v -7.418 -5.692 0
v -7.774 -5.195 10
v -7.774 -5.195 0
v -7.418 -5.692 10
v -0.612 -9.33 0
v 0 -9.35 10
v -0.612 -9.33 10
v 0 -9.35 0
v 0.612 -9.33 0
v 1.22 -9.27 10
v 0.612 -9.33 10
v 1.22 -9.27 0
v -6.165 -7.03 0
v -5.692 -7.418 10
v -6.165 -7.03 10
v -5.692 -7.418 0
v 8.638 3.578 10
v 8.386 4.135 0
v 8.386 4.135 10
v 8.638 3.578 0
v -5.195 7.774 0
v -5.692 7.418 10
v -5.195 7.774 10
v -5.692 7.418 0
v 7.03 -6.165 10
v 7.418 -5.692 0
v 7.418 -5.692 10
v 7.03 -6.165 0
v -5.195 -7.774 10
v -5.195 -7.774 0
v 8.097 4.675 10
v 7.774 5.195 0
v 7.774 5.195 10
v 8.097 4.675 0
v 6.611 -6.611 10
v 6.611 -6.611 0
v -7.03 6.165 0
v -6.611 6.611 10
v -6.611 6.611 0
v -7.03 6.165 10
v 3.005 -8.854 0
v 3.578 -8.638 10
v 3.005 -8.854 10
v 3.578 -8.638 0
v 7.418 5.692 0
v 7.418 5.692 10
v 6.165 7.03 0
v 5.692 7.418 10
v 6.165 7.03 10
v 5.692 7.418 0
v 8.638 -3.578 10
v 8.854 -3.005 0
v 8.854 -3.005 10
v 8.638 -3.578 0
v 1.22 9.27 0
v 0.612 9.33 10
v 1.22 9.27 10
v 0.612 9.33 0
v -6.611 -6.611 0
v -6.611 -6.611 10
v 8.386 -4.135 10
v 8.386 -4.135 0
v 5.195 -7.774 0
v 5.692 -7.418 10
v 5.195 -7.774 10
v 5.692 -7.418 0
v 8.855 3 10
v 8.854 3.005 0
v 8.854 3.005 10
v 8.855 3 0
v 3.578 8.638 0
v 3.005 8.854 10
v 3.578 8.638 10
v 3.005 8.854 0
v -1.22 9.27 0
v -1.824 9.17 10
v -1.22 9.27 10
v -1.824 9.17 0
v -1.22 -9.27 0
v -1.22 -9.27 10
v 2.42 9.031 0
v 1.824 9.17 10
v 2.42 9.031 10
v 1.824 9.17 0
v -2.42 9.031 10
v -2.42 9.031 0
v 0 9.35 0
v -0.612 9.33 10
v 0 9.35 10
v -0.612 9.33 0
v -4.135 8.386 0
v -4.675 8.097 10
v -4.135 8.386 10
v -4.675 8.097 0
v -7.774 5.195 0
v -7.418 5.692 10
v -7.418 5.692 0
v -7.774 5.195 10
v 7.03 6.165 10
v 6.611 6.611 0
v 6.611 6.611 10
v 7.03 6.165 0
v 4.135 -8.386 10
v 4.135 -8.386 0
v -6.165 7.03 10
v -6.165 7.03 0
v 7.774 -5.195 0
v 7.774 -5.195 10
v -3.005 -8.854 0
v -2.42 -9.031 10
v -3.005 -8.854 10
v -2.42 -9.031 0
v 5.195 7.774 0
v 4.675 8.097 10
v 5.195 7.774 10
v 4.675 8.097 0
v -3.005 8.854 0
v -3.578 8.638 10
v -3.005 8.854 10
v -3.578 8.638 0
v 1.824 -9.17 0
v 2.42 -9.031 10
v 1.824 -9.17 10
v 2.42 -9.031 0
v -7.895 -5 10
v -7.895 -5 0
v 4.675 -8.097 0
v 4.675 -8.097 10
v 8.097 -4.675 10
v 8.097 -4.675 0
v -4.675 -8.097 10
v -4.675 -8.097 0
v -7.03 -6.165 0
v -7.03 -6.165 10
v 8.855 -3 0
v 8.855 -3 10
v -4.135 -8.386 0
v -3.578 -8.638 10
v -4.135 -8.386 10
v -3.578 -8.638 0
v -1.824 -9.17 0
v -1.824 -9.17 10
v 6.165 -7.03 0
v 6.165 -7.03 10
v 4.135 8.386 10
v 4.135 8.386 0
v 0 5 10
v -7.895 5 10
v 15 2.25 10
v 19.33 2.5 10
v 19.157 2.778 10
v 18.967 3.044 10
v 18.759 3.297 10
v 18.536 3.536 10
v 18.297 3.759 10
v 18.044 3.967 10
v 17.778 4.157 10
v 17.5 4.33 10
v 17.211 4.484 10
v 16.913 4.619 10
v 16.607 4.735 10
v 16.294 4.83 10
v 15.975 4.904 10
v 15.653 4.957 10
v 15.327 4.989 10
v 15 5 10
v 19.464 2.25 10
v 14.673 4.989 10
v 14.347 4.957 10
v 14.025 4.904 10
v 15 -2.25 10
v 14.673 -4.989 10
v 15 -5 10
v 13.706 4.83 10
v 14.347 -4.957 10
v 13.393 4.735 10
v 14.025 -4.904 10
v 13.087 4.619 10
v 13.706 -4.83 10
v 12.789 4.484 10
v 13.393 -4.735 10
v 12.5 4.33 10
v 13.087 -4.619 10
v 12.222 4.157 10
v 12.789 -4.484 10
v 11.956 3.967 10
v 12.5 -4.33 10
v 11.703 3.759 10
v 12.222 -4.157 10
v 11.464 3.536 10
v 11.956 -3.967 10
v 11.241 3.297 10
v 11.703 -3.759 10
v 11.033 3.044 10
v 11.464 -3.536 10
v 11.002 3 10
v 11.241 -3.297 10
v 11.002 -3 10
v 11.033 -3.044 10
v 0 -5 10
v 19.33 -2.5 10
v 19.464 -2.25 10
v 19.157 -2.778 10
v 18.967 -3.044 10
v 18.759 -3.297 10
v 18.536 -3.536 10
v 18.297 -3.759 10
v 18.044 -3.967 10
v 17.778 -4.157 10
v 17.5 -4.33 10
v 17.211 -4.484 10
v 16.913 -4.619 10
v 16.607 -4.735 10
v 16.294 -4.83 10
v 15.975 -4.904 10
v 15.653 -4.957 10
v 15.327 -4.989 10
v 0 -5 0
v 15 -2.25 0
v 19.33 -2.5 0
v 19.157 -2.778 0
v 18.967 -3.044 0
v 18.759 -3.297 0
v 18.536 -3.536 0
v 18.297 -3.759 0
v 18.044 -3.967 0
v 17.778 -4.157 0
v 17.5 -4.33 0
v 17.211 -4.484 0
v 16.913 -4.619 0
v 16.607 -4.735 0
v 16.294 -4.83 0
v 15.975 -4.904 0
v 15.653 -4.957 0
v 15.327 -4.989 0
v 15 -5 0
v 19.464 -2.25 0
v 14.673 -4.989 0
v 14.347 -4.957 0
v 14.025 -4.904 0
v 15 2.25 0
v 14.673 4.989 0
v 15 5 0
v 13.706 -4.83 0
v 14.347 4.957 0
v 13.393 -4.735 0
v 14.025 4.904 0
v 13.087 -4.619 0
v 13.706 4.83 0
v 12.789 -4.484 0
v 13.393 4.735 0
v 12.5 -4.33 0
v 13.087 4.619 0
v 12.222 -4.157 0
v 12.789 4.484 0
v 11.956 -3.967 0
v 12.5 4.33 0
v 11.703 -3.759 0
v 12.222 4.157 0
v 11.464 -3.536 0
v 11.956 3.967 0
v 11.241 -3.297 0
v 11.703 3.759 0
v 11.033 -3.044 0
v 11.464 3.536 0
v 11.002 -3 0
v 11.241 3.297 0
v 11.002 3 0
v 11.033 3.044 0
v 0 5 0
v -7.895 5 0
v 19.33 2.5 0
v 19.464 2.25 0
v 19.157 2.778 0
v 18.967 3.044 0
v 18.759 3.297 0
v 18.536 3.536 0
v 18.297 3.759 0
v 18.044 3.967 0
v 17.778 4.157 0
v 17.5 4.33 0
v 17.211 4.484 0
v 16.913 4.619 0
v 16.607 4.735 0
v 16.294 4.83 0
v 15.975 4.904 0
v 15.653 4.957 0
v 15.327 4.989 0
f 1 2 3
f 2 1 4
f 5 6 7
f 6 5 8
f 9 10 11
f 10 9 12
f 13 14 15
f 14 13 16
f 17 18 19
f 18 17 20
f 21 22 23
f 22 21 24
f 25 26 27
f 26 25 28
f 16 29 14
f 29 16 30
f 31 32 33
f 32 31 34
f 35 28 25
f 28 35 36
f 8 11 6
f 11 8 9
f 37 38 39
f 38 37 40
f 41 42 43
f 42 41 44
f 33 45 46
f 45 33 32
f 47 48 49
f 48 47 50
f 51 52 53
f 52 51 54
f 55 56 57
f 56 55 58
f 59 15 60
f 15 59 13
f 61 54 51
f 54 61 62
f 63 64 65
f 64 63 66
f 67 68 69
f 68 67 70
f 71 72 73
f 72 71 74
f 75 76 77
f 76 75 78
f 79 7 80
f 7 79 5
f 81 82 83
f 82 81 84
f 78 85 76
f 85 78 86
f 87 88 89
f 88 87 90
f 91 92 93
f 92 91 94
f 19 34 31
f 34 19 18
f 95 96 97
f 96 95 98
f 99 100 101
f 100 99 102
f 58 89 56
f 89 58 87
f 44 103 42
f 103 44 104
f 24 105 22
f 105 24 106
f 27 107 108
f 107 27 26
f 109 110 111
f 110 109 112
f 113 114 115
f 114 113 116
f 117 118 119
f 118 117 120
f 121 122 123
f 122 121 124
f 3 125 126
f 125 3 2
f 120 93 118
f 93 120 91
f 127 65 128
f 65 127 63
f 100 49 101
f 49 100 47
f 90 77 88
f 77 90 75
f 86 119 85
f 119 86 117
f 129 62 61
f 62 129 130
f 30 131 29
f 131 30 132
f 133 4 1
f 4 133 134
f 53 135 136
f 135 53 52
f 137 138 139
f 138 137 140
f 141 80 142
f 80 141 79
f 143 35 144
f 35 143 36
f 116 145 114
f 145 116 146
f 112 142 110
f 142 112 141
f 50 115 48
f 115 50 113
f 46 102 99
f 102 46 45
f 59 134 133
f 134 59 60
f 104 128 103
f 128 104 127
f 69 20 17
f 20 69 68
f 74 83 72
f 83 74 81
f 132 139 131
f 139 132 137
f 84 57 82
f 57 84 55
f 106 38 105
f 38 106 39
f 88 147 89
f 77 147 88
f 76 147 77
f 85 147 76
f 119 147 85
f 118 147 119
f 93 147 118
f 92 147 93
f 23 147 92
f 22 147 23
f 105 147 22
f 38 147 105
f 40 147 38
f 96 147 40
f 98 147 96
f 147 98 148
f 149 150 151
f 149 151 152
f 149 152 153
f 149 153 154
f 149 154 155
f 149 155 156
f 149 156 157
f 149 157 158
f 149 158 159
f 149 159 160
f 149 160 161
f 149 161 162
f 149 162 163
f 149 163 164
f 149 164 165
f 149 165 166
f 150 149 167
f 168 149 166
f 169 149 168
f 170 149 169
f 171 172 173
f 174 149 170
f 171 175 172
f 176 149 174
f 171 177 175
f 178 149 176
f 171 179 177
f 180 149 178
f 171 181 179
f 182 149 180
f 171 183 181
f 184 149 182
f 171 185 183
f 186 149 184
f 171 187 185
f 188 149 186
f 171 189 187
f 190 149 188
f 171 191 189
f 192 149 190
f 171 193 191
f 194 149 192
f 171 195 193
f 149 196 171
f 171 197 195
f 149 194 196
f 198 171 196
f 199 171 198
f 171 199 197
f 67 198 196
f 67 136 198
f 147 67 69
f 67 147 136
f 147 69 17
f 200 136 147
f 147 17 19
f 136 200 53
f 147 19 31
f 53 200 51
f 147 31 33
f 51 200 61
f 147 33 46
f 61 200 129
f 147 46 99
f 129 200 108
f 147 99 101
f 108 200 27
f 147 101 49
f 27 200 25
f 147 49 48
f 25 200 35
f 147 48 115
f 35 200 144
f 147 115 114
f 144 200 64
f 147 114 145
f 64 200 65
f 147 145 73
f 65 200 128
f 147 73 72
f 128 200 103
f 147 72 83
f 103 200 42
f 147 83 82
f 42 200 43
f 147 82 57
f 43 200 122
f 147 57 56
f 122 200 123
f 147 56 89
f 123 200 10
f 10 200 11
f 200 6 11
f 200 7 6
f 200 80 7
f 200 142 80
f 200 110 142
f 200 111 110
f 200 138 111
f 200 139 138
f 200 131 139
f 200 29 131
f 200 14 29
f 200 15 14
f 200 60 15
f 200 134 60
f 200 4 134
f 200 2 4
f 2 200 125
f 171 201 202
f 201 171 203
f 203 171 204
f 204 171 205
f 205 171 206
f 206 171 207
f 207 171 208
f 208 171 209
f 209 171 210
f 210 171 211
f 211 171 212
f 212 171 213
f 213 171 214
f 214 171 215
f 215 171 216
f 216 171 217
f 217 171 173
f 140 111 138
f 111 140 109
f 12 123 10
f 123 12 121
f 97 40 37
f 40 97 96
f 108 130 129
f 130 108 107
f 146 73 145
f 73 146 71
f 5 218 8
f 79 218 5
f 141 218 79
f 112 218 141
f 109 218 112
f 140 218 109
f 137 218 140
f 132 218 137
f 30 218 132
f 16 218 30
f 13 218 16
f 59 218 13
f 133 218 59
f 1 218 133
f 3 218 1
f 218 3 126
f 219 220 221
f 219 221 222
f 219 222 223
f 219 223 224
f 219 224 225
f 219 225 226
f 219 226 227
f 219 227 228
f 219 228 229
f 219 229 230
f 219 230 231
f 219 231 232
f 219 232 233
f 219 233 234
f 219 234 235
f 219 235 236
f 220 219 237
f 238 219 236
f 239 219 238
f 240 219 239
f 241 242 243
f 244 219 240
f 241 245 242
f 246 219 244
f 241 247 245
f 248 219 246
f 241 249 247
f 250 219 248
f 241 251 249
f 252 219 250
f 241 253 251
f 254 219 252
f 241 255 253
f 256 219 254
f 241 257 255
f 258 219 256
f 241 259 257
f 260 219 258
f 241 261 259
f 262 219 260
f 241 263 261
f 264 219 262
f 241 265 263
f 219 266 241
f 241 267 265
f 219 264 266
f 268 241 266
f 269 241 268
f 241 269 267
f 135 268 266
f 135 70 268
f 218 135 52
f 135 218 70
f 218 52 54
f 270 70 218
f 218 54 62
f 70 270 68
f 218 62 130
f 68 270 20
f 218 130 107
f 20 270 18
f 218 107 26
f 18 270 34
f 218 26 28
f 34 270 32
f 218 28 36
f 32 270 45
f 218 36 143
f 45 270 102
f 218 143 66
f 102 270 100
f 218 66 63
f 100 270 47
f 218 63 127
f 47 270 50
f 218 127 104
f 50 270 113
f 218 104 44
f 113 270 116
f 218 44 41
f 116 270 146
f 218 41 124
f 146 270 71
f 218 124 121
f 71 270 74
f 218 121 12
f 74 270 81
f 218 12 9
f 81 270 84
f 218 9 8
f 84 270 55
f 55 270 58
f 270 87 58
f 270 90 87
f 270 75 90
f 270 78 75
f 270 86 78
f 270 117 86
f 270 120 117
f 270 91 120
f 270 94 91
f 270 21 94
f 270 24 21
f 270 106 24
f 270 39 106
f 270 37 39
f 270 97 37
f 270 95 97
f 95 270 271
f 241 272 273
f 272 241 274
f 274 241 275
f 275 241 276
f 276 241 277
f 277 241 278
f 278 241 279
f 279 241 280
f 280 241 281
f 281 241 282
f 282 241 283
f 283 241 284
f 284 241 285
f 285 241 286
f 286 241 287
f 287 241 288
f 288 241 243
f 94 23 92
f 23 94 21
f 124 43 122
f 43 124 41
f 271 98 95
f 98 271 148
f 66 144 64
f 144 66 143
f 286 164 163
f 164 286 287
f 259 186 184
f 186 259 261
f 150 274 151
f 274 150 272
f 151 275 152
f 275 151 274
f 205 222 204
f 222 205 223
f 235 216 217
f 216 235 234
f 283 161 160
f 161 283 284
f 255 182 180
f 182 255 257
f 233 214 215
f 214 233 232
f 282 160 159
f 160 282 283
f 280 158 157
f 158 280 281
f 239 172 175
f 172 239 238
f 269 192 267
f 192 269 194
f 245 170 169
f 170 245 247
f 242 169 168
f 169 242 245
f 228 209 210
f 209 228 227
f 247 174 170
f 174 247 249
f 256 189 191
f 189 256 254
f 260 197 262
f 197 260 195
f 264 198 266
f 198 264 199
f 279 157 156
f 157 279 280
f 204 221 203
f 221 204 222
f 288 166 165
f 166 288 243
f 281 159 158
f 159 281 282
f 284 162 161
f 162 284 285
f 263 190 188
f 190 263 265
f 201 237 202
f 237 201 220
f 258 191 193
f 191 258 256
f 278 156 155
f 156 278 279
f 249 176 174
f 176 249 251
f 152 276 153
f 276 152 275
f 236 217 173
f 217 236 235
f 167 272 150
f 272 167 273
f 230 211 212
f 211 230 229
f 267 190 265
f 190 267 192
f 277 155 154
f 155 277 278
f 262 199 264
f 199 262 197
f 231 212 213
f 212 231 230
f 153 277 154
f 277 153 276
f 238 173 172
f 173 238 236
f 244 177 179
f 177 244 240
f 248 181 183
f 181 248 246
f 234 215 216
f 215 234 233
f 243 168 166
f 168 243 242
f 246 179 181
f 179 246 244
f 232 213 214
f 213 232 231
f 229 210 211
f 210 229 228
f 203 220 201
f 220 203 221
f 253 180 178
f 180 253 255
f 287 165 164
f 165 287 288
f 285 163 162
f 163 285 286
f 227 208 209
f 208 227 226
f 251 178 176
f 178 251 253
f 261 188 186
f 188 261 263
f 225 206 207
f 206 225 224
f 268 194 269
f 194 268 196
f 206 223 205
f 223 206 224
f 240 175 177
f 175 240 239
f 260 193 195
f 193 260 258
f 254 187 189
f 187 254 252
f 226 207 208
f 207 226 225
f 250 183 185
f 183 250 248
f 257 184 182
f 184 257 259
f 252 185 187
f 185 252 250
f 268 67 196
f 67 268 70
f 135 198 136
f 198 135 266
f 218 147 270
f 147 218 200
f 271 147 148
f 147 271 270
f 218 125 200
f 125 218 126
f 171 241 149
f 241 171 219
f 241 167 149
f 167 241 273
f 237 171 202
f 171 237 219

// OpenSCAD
// Snap-on tubing clip for 12.7 mm stand rod
// Print orientation: flat on bed, extruded up in +Z

$fn = 96;

// ---- Dimensions (mm) ----
rod_d      = 12.7;   // stand rod diameter
ring_w     = 3;      // rod ring wall thickness
ring_od    = rod_d + 2*ring_w;  // rod ring outer diameter (18.7)
open_w     = 10;     // rod ring opening width (-X side)

tubing_id  = 6;      // tubing inner diameter
tubing_w   = 2;      // tubing ring wall thickness
tubing_od  = tubing_id + 2*tubing_w;  // tubing outer diameter (10)
tubing_x   = 15;     // tubing ring centre X
open_t     = 4.5;    // tubing opening width (+X side)

bridge_x0  = 8;      // bridge start X
bridge_x1  = 12;     // bridge end X
bridge_w   = 6;      // bridge width (Y)

h          = 10;     // extrusion height
eps        = 0.5;    // cutter overshoot

// ---- Model ----
difference() {
    union() {
        // Rod ring
        cylinder(d = ring_od, h = h);
        // Tubing ring
        translate([tubing_x, 0, 0])
            cylinder(d = tubing_od, h = h);
        // Bridge
        translate([bridge_x0, -bridge_w/2, 0])
            cube([bridge_x1 - bridge_x0, bridge_w, h]);
    }
    // Rod ring opening (-X side)
    translate([-ring_od/2 - eps, -open_w/2, -eps])
        cube([ring_od/2 + eps, open_w, h + 2*eps]);
    // Tubing opening (+X side)
    translate([tubing_x, -open_t/2, -eps])
        cube([ring_od/2 + eps, open_t, h + 2*eps]);
}
